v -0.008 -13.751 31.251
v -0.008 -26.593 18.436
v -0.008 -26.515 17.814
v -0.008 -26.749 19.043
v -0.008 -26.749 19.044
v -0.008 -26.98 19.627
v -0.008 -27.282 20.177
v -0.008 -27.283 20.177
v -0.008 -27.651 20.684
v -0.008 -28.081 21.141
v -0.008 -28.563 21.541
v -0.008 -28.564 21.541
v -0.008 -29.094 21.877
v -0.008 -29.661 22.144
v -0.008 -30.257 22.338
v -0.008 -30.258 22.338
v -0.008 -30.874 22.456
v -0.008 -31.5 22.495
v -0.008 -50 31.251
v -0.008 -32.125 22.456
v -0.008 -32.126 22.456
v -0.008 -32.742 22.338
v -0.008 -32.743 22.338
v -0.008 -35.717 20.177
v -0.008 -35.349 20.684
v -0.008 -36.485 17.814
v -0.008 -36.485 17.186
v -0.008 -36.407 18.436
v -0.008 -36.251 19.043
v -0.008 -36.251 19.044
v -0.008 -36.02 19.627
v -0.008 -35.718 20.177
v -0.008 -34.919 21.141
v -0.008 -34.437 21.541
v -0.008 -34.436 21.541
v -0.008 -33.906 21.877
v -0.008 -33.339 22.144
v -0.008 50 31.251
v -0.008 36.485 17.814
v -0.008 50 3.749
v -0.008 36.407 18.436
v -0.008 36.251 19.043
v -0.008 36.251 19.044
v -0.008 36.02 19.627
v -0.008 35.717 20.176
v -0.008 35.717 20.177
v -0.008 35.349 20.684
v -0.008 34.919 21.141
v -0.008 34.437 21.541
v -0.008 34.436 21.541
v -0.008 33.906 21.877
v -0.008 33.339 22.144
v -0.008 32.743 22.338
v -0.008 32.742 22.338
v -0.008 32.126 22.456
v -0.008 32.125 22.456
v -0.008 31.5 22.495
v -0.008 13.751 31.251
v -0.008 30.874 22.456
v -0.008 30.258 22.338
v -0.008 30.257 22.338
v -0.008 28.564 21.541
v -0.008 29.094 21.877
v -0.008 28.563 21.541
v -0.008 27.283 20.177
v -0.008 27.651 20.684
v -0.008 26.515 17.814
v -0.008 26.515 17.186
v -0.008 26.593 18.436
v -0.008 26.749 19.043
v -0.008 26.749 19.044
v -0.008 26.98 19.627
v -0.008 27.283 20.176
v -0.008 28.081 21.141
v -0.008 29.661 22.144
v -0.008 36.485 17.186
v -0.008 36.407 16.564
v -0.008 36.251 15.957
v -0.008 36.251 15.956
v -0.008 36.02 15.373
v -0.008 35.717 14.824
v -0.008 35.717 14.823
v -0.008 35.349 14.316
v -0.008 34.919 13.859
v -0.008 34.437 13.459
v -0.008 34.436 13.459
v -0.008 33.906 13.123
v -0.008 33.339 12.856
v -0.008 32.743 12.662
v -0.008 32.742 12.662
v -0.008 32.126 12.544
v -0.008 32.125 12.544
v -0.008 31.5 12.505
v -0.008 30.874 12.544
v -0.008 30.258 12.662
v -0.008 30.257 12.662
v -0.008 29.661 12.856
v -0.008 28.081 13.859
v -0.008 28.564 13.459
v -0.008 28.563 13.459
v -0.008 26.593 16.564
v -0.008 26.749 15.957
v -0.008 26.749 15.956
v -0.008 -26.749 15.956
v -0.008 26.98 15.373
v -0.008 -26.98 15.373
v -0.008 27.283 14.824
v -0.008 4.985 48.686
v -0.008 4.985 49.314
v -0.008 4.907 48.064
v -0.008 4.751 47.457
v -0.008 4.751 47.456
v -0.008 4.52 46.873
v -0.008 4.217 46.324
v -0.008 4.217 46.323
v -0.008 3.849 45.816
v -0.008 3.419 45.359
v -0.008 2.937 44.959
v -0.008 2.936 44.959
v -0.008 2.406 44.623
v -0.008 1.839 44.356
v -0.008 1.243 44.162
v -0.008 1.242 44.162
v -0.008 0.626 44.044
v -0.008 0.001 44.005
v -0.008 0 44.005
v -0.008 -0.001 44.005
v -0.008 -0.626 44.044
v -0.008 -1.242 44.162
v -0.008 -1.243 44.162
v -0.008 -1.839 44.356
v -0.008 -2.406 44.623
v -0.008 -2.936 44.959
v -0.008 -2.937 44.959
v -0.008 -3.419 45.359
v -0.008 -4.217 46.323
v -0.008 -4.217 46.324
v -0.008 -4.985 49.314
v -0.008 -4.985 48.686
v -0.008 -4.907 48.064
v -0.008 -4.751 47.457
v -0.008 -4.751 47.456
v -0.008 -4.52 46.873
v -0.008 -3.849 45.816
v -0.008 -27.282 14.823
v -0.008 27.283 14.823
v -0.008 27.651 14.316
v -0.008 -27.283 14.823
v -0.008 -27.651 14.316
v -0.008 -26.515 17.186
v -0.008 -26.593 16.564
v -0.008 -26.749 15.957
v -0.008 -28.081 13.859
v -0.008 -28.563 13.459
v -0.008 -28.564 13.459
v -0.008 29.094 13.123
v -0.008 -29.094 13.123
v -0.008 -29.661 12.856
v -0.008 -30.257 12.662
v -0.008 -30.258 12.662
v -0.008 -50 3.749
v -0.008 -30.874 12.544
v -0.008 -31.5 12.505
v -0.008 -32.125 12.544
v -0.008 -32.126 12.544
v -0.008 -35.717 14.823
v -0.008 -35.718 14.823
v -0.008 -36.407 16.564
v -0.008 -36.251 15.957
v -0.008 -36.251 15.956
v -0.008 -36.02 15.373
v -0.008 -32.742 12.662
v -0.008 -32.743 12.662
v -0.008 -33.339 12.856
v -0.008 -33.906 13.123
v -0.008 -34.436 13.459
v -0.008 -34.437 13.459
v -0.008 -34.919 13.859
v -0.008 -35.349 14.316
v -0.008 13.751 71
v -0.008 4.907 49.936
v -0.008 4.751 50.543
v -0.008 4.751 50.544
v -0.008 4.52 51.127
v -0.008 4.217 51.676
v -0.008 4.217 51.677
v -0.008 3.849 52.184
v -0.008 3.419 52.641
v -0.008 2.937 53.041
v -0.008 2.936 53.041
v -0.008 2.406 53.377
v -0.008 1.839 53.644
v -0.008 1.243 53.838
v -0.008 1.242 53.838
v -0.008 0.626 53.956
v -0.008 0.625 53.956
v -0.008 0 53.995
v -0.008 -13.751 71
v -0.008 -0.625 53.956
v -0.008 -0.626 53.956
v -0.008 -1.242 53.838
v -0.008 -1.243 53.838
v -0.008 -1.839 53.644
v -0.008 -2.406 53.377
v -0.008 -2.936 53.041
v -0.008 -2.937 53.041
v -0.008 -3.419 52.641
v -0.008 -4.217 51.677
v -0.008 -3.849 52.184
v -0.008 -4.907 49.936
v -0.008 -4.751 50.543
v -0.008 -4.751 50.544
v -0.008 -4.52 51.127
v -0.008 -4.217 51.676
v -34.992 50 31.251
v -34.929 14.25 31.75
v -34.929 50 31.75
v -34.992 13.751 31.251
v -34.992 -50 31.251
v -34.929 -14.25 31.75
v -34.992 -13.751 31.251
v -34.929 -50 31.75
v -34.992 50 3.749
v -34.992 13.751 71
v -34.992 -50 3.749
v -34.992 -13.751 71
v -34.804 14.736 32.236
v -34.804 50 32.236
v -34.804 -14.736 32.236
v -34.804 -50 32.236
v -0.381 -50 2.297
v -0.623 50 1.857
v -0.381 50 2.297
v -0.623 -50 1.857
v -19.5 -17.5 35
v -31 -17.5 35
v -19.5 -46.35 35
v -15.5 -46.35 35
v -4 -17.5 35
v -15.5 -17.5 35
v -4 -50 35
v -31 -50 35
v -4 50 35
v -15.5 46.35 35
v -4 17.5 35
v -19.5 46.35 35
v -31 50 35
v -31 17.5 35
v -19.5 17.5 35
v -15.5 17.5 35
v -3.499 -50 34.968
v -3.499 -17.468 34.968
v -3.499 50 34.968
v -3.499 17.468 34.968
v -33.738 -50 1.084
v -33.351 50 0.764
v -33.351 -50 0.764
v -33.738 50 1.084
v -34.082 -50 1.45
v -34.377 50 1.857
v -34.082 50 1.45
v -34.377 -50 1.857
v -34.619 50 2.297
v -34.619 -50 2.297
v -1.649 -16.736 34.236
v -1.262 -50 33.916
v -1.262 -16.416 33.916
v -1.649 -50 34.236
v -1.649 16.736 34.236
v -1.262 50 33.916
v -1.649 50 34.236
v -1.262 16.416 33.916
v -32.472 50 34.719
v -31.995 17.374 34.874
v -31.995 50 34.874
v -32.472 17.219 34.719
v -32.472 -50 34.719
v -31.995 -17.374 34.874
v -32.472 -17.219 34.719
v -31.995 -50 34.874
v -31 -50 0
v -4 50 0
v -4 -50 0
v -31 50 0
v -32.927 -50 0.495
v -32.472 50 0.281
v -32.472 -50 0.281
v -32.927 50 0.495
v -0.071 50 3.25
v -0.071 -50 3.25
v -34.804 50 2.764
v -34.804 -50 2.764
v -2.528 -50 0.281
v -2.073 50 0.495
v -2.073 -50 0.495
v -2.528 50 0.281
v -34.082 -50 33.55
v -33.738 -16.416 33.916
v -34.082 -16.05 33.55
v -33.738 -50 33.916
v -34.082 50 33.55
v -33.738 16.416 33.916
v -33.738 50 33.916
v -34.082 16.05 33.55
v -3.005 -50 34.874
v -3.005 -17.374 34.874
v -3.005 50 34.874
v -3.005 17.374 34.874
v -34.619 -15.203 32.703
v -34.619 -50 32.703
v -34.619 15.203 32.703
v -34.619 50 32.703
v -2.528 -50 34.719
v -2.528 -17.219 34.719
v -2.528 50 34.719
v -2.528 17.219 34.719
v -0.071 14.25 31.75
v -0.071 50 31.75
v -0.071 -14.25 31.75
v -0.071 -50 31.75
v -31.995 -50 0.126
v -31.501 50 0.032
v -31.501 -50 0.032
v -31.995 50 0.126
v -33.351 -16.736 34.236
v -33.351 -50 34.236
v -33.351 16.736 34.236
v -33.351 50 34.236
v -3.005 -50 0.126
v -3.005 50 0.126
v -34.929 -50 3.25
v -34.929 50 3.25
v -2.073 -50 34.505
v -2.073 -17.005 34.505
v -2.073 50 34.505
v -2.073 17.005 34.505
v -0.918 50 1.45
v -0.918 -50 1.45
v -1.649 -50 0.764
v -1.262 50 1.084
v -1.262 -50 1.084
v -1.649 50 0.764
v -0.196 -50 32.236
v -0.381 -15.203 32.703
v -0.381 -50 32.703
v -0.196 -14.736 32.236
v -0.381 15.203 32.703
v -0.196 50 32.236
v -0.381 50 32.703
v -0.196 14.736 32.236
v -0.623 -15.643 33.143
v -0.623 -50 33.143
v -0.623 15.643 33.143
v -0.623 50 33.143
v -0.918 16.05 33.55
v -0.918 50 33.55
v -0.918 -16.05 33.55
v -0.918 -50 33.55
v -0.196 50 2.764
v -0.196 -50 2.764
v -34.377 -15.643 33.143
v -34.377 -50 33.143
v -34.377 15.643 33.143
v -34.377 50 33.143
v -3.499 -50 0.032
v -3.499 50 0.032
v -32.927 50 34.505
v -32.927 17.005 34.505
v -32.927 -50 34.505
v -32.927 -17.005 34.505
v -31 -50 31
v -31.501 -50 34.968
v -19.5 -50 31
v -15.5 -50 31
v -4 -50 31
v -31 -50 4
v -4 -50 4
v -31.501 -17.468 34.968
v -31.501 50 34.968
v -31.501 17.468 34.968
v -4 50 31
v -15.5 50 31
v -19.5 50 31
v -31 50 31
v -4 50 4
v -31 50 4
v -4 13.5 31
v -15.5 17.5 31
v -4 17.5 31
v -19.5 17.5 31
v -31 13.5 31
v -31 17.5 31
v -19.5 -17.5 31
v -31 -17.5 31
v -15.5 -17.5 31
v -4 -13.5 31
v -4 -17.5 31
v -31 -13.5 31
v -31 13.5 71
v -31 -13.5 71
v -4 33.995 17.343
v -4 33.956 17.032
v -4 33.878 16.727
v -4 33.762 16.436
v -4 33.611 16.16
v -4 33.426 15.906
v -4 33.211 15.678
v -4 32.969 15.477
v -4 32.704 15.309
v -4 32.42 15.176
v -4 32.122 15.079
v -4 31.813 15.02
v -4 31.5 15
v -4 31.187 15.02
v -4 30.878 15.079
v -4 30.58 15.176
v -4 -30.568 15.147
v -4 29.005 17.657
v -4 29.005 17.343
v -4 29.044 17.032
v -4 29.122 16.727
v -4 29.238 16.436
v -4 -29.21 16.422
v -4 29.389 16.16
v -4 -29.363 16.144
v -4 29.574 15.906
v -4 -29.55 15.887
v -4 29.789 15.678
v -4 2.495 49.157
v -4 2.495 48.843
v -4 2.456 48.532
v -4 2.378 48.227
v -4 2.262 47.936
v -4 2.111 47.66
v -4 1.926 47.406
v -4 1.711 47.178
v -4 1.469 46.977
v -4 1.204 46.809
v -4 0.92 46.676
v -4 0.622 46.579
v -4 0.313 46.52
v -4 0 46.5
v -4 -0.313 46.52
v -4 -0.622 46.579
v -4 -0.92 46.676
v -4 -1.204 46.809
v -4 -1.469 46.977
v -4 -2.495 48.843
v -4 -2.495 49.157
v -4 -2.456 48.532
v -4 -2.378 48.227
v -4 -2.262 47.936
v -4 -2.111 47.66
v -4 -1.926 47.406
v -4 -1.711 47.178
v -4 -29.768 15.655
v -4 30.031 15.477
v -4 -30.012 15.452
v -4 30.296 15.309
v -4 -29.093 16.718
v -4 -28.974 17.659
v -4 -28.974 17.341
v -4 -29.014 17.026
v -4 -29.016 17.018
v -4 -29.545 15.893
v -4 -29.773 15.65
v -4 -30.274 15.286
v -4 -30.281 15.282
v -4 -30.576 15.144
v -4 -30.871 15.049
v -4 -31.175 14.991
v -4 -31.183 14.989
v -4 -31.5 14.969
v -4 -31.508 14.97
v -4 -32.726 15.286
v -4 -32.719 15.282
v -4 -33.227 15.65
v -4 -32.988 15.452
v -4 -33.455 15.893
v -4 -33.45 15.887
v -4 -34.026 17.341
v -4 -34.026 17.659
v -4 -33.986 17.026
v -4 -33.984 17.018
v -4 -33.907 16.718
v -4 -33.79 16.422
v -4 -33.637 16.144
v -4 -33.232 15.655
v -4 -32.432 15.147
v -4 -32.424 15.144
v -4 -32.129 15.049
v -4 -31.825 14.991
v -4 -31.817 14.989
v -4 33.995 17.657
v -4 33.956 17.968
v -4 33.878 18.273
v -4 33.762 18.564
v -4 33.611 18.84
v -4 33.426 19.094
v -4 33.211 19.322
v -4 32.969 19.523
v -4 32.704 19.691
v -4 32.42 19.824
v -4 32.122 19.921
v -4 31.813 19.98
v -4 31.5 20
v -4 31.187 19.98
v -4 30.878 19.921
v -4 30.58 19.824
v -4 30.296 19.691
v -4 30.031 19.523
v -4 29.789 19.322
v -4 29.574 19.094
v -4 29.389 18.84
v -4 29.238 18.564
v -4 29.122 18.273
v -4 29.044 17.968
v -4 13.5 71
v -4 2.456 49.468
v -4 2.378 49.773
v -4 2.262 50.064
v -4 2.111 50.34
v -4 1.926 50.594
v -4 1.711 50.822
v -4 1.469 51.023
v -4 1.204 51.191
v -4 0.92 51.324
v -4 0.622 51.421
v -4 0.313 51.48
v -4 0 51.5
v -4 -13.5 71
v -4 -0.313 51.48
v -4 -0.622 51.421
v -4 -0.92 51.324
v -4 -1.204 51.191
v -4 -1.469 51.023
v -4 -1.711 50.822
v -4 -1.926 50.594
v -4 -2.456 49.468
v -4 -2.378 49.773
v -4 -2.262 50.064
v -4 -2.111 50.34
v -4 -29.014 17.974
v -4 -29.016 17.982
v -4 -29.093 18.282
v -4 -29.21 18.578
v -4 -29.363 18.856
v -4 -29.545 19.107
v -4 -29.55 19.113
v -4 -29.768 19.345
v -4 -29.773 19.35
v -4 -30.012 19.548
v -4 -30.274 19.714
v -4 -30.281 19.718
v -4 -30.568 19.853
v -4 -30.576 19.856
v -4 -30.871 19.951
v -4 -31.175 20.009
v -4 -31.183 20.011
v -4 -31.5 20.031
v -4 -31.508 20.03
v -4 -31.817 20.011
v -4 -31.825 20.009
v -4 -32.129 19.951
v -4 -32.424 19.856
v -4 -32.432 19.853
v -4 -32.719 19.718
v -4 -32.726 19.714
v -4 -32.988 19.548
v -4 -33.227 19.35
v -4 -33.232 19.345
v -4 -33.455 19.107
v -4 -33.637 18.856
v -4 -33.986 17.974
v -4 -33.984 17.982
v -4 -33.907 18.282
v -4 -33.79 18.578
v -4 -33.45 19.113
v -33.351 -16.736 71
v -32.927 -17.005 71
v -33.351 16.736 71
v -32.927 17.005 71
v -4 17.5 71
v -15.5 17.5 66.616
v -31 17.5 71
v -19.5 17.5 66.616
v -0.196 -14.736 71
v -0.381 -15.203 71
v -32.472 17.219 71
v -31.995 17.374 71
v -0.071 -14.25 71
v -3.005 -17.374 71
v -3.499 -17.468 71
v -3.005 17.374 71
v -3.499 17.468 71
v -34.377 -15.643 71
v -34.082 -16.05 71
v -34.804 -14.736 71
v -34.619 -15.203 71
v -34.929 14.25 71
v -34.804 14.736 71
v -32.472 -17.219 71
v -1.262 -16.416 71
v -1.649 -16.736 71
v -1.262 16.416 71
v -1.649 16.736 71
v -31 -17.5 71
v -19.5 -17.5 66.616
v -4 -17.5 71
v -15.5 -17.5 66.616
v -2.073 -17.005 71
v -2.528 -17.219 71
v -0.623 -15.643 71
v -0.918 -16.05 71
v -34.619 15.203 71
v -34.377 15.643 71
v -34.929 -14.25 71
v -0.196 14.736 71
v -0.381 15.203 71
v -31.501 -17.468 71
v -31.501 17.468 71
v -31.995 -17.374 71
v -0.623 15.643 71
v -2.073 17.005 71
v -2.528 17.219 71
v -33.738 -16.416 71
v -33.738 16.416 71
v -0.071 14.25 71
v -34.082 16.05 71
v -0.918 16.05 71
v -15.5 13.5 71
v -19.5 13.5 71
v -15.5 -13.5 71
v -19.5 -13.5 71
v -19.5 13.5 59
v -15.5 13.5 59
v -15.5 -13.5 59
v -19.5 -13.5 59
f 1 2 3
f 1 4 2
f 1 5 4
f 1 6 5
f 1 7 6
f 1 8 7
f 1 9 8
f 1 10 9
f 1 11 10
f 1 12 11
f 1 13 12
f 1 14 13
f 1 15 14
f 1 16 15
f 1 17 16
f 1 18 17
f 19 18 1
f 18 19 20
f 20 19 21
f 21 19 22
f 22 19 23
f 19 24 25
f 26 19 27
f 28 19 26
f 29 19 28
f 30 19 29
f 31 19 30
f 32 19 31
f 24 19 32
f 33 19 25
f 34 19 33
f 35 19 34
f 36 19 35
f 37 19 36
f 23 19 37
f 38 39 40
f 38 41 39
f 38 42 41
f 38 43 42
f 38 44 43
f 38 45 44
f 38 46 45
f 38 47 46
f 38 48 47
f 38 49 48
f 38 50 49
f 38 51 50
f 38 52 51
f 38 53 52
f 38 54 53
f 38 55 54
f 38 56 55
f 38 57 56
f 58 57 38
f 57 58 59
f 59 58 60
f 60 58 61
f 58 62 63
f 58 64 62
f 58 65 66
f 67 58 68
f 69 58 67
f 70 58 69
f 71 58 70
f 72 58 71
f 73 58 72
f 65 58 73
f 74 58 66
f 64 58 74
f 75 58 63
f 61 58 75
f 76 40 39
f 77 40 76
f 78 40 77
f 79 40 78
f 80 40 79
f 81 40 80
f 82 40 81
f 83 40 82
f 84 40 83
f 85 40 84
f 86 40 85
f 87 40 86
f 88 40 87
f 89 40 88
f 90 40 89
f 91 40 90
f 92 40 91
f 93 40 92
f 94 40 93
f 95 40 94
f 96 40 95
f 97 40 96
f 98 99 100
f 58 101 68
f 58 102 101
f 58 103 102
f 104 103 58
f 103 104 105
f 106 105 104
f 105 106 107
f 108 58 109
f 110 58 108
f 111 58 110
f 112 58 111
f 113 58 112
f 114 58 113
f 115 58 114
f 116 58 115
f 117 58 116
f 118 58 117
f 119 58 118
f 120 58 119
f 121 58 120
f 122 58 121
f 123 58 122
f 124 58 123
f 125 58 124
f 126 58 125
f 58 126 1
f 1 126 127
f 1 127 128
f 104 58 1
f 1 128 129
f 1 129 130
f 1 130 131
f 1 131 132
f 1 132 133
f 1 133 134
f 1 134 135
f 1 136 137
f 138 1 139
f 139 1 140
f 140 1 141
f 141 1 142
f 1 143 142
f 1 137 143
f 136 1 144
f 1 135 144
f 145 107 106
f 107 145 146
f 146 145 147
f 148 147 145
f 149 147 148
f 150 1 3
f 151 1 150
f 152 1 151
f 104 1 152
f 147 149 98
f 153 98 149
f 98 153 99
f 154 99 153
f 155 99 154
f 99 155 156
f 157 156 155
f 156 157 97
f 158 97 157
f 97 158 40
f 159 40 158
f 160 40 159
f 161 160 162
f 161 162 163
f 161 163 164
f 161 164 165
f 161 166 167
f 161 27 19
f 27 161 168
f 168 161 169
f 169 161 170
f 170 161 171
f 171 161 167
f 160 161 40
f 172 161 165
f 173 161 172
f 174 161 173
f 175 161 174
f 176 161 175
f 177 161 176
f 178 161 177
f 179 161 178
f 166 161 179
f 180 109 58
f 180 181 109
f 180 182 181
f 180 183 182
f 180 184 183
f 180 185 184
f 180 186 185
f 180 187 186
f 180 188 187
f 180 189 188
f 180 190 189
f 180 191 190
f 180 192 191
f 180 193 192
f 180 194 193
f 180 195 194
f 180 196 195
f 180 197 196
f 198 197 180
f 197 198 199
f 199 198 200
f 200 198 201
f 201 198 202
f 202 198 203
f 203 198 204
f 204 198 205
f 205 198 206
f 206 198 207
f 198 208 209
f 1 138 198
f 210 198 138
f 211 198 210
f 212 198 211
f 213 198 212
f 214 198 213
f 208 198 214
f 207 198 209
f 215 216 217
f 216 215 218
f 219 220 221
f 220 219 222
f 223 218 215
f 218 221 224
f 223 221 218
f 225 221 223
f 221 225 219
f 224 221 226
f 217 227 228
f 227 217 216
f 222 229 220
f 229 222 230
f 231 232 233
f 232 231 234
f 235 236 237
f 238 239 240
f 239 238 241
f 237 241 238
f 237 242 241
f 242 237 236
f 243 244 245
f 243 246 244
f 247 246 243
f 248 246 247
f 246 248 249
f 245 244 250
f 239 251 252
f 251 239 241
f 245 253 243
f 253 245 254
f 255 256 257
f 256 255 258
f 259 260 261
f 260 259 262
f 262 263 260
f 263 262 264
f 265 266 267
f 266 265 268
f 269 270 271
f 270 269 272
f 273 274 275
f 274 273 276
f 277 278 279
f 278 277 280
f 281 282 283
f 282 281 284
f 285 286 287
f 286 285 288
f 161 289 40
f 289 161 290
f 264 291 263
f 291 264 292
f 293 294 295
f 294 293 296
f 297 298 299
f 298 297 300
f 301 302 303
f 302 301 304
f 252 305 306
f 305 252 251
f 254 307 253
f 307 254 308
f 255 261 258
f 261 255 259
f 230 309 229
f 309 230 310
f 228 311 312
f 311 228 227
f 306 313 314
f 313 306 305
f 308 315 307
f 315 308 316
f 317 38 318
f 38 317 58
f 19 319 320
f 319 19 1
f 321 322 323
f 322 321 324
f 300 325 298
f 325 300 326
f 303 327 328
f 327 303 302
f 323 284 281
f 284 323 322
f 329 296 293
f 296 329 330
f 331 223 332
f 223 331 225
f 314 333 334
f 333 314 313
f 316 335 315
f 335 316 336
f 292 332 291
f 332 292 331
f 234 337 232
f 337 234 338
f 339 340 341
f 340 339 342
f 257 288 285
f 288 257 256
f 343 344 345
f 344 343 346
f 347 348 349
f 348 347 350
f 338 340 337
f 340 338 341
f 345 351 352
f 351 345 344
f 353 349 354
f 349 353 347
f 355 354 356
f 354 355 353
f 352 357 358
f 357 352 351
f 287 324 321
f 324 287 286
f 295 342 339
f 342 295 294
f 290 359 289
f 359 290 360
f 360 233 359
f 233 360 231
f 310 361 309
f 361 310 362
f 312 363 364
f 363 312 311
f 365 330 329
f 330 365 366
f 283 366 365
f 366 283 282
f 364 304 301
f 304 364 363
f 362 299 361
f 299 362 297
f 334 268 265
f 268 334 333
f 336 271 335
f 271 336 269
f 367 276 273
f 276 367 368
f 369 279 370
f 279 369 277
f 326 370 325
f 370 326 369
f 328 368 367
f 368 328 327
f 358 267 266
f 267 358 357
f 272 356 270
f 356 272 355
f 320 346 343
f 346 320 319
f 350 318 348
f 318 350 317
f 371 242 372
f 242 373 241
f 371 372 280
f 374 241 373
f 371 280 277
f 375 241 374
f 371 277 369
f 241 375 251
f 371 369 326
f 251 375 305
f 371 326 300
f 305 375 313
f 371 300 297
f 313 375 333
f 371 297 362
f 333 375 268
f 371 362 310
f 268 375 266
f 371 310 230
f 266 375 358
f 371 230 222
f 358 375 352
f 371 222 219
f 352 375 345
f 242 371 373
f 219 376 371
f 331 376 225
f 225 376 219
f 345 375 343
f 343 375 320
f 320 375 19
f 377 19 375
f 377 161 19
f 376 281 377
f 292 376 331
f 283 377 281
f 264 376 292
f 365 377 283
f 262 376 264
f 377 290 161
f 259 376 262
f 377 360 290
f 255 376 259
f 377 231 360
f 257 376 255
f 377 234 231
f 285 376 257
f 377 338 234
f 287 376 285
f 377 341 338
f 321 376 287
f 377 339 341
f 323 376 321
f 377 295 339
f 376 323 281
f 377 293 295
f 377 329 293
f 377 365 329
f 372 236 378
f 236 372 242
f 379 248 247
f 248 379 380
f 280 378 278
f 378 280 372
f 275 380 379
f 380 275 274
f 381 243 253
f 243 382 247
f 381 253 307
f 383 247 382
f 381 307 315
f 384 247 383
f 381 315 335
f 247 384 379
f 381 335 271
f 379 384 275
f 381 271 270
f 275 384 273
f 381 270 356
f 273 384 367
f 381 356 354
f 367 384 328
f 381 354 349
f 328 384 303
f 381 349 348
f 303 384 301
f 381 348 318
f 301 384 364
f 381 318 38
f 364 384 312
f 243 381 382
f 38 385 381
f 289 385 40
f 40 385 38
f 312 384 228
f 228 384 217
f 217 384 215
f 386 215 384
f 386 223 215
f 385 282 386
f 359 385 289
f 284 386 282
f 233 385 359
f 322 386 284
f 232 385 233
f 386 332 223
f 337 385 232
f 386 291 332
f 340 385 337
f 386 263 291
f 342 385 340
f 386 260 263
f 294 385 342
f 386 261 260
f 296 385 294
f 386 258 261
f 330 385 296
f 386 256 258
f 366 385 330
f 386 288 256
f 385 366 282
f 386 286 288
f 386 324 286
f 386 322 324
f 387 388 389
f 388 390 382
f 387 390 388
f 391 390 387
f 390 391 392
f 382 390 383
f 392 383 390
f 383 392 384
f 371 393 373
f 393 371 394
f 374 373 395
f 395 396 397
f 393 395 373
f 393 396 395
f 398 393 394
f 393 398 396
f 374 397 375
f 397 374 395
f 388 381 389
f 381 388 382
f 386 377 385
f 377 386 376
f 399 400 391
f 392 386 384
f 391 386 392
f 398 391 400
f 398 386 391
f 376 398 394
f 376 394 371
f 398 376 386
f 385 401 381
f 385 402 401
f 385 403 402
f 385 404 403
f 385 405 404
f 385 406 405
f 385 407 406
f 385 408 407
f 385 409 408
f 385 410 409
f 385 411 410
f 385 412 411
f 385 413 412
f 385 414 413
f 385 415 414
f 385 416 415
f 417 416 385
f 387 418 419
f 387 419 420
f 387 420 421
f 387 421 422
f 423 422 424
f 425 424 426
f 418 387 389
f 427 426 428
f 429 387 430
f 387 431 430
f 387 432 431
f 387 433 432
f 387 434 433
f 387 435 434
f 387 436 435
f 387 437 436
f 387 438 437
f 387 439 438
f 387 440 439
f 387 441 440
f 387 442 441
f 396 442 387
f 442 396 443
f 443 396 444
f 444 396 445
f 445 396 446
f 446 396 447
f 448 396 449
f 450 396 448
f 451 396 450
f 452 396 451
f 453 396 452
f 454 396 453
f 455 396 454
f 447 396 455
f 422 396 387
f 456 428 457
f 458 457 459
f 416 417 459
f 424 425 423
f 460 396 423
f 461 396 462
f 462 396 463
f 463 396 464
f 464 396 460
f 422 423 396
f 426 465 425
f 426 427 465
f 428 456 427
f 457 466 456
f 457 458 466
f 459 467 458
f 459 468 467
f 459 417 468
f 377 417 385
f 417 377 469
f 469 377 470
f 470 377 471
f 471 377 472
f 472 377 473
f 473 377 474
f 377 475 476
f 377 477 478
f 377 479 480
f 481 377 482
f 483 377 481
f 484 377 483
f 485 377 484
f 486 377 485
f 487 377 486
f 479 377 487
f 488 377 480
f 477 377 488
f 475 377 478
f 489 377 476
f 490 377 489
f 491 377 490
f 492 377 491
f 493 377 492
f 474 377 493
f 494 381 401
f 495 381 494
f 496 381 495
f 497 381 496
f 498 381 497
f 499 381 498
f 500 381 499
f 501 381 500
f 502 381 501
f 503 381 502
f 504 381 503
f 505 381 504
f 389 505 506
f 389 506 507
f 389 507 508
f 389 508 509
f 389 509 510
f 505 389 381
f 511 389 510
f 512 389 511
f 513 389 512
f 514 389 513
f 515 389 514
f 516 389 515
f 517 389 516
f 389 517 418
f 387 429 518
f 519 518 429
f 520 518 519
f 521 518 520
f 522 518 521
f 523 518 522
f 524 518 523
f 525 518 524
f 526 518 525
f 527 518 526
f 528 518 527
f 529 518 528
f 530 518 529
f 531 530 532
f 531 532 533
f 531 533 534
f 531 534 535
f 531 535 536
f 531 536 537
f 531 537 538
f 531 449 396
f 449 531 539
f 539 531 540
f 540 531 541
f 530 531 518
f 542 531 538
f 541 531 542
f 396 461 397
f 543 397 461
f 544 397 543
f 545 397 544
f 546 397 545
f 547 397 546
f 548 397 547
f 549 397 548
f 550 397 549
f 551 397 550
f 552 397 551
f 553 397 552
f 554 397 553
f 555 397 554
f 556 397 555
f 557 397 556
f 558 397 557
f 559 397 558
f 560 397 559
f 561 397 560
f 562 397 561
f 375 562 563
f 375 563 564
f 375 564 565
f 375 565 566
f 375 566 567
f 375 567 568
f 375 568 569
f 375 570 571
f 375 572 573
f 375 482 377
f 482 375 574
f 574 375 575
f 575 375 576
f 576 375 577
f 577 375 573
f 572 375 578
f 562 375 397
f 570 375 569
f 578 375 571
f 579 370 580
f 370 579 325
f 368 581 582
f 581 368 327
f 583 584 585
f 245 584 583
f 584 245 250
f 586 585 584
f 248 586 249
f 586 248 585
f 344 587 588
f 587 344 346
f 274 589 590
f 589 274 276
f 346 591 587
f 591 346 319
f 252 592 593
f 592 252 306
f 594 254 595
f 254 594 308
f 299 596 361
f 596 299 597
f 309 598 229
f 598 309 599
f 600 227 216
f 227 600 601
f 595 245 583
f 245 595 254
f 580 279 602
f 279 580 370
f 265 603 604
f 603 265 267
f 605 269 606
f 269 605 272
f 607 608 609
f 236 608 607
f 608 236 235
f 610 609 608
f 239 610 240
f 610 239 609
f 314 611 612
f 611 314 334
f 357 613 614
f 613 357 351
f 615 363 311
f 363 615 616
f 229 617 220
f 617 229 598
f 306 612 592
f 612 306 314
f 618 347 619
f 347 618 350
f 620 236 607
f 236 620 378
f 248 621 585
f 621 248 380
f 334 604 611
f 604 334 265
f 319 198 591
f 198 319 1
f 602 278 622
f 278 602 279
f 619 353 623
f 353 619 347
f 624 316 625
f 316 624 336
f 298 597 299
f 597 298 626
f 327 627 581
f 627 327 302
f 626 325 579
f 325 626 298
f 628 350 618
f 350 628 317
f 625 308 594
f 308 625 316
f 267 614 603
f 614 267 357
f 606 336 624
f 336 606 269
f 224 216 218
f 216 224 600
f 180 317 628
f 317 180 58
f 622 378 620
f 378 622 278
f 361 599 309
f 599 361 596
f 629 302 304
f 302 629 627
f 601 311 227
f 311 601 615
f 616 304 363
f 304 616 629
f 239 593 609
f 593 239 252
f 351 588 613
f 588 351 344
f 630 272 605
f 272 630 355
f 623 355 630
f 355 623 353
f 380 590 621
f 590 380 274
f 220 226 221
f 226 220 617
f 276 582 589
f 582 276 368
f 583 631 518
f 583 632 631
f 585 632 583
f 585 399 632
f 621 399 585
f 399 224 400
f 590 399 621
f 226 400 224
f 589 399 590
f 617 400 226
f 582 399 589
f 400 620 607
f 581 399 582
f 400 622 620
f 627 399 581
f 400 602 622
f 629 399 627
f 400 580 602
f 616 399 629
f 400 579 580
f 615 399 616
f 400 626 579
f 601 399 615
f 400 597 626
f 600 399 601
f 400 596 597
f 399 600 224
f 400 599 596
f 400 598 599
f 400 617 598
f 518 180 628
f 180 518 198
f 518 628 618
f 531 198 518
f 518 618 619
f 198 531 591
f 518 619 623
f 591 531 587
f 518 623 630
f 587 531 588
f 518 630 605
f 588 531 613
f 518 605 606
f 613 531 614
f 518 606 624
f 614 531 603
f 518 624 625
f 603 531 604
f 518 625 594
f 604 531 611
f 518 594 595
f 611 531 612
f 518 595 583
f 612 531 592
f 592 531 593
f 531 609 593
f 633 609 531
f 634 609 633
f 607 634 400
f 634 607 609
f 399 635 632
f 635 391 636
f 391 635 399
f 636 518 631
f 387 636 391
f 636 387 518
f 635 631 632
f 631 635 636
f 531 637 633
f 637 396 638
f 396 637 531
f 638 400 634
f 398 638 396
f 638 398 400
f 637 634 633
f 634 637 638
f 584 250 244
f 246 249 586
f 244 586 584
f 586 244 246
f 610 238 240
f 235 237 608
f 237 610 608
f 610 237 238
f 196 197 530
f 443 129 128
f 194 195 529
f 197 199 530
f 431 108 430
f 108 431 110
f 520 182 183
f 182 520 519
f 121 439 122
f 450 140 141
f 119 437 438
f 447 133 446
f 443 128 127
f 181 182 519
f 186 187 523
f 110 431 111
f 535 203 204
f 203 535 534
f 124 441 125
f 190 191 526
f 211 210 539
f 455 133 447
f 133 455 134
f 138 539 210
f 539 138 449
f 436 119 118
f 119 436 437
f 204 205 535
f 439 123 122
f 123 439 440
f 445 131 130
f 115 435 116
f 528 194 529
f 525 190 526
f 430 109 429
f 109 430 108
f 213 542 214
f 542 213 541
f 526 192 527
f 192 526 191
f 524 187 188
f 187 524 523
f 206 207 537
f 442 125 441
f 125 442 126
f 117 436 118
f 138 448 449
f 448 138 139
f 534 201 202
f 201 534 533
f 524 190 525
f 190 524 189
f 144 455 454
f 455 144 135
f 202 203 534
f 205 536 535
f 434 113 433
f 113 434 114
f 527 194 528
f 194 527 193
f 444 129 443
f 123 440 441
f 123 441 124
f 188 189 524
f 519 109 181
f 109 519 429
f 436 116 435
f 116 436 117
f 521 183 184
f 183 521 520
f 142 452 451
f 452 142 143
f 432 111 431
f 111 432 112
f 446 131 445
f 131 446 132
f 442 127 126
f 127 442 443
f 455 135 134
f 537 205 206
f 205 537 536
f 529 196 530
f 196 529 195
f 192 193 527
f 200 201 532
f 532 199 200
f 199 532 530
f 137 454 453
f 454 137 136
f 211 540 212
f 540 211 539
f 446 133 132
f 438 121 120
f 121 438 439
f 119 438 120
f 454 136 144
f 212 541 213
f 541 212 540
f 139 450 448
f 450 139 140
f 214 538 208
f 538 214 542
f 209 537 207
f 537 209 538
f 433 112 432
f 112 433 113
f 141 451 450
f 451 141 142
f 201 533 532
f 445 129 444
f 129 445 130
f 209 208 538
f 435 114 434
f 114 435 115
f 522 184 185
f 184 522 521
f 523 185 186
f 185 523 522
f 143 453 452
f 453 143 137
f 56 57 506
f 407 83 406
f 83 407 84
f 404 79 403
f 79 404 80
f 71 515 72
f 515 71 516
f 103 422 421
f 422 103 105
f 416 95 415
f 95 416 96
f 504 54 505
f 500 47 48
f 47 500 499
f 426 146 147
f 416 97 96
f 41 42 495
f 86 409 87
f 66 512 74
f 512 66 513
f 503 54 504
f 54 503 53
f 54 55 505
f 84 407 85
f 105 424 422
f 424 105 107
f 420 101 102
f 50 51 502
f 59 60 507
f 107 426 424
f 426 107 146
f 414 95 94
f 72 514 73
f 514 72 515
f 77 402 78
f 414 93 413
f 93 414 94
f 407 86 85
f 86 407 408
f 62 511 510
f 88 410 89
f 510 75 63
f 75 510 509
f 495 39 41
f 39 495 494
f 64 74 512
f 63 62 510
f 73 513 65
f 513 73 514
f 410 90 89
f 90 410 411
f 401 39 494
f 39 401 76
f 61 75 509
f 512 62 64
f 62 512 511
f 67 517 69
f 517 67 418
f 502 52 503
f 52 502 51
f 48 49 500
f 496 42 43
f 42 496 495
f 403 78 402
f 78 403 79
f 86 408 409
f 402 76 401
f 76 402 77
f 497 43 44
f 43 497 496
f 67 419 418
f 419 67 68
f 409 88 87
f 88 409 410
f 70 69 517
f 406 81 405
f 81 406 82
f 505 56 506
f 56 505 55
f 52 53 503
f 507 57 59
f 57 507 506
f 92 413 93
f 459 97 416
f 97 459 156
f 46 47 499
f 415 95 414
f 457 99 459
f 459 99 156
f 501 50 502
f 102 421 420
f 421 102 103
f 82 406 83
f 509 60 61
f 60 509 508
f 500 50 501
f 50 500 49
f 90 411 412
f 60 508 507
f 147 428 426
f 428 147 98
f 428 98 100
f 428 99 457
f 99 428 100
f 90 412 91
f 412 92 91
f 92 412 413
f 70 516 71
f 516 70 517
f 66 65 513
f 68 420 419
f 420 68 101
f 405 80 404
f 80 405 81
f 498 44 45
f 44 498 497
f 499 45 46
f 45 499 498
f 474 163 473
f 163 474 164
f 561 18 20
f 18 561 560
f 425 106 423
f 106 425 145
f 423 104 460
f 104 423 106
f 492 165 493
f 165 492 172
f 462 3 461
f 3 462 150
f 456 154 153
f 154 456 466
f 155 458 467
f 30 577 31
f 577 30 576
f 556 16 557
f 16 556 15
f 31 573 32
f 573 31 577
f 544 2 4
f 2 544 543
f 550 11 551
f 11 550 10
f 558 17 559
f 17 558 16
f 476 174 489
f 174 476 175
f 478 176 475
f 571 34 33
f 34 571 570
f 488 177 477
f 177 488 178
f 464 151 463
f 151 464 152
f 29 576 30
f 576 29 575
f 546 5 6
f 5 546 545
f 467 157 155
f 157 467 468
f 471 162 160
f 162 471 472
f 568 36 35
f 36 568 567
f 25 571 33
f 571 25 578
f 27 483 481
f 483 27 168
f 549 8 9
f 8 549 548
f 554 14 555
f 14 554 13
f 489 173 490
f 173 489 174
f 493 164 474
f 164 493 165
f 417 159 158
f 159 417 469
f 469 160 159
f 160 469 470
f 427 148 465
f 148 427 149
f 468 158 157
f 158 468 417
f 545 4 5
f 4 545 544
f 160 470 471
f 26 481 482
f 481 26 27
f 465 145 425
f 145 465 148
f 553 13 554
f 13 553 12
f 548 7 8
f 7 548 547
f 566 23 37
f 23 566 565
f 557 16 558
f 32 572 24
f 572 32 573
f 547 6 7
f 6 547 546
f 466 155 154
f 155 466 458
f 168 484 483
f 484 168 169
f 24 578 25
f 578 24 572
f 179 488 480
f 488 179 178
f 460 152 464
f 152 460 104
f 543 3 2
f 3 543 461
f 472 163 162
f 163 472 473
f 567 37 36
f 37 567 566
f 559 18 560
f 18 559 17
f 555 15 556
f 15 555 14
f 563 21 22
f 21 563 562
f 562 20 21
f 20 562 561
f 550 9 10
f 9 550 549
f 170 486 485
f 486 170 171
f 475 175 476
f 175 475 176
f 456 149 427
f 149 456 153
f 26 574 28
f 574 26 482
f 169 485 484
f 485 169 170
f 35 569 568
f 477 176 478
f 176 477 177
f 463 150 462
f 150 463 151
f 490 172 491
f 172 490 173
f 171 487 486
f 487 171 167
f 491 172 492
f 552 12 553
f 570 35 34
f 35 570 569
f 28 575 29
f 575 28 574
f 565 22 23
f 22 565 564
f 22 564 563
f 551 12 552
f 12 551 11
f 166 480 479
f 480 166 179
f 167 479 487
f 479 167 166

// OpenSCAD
use <MCAD/triangles.scad>

lengthY = 100;
lengthX = 40;
woodX = 27;
wallThick = 4;
screwHead = 10;
screwD = 5;
translate([0,0,0.5*woodX+wallThick]) rotate([0,-90,0])
difference() {
    union() {
        // attache() on Y axis
        translate([0,0,0.5*woodX+wallThick])
            rotate([90,0,0]) attache(woodX,woodX,lengthY,wallThick);
            translate([(lengthX+woodX)/2,0,0.5*woodX+wallThick])
                rotate([90,0,90]) attache(woodX,woodX,lengthX,wallThick);
        // attache() on X axis    
        translate([0.5*woodX,0.5*woodX,(woodX+wallThick)/2]) 
            triangle((lengthY-woodX)/2, lengthX, wallThick);
        // triangle reinforcement
        mirror([0,1,0]) translate([0.5*woodX,0.5*woodX,(woodX+wallThick)/2]) 
            triangle((lengthY-woodX)/2, lengthX, wallThick);
        //triangle(40, 20, wallThick);
    }
    // Cut interior of XY intersection
    translate([+0.5*woodX+wallThick,0,0.5*woodX+wallThick]) 
        #cube([lengthX+2*wallThick,woodX,woodX], true);
    // Add holes for screws
    /* X */
    translate([0.5*woodX+0.35*lengthX+wallThick,0,0]) 
        #cylinder(h=wallThick, d1=screwHead, d2=screwD, $fn=50);
    /*translate([0.5*woodX+0.35*lengthX+wallThick,0,woodX+wallThick-0.05]) 
        #cylinder(h=wallThick+0.1, d1=screwD, d2=screwHead, $fn=50);*/
    /* Y>0 */    
    translate([0,0.5*woodX+0.35*lengthX+wallThick,0])
        #cylinder(h=wallThick, d1=screwHead, d2=screwD, $fn=50);
    /*translate([0,0.5*woodX+0.35*lengthX+wallThick,woodX+wallThick-0.05]) #cylinder(h=wallThick+0.1, d1=screwD, d2=screwHead, $fn=50);*/
    /* Y<0 */    
    translate([0,-0.5*woodX-0.35*lengthX-wallThick,0]) 
        #cylinder(h=wallThick+0.05, d1=screwHead, d2=screwD, $fn=50);
    /*translate([0,-0.5*woodX-0.35*lengthX-wallThick,woodX+wallThick-0.05]) #cylinder(h=wallThick+0.1, d1=screwD, d2=screwHead, $fn=50);*/
    
}


module attache(sizeX,sizeY,sizeZ,thick)
difference() {
    roundedBox(sizeX+2*thick,sizeY+2*thick,sizeZ, thick);
    translate([0,0,-thick]) cube([sizeX,sizeY,sizeZ+2*thick], true);
}

module roundedBox(x,y,z,rad){
	hull() {
        translate([-x/2+rad, y/2-rad,-z/2]) cylinder(h=z,r=rad, $fn=50);
        translate([ x/2-rad, y/2-rad,-z/2]) cylinder(h=z,r=rad, $fn=50);
        translate([-x/2+rad,-y/2+rad,-z/2]) cylinder(h=z,r=rad, $fn=50);
        translate([ x/2-rad,-y/2+rad,-z/2]) cylinder(h=z,r=rad, $fn=50);
   }
}
